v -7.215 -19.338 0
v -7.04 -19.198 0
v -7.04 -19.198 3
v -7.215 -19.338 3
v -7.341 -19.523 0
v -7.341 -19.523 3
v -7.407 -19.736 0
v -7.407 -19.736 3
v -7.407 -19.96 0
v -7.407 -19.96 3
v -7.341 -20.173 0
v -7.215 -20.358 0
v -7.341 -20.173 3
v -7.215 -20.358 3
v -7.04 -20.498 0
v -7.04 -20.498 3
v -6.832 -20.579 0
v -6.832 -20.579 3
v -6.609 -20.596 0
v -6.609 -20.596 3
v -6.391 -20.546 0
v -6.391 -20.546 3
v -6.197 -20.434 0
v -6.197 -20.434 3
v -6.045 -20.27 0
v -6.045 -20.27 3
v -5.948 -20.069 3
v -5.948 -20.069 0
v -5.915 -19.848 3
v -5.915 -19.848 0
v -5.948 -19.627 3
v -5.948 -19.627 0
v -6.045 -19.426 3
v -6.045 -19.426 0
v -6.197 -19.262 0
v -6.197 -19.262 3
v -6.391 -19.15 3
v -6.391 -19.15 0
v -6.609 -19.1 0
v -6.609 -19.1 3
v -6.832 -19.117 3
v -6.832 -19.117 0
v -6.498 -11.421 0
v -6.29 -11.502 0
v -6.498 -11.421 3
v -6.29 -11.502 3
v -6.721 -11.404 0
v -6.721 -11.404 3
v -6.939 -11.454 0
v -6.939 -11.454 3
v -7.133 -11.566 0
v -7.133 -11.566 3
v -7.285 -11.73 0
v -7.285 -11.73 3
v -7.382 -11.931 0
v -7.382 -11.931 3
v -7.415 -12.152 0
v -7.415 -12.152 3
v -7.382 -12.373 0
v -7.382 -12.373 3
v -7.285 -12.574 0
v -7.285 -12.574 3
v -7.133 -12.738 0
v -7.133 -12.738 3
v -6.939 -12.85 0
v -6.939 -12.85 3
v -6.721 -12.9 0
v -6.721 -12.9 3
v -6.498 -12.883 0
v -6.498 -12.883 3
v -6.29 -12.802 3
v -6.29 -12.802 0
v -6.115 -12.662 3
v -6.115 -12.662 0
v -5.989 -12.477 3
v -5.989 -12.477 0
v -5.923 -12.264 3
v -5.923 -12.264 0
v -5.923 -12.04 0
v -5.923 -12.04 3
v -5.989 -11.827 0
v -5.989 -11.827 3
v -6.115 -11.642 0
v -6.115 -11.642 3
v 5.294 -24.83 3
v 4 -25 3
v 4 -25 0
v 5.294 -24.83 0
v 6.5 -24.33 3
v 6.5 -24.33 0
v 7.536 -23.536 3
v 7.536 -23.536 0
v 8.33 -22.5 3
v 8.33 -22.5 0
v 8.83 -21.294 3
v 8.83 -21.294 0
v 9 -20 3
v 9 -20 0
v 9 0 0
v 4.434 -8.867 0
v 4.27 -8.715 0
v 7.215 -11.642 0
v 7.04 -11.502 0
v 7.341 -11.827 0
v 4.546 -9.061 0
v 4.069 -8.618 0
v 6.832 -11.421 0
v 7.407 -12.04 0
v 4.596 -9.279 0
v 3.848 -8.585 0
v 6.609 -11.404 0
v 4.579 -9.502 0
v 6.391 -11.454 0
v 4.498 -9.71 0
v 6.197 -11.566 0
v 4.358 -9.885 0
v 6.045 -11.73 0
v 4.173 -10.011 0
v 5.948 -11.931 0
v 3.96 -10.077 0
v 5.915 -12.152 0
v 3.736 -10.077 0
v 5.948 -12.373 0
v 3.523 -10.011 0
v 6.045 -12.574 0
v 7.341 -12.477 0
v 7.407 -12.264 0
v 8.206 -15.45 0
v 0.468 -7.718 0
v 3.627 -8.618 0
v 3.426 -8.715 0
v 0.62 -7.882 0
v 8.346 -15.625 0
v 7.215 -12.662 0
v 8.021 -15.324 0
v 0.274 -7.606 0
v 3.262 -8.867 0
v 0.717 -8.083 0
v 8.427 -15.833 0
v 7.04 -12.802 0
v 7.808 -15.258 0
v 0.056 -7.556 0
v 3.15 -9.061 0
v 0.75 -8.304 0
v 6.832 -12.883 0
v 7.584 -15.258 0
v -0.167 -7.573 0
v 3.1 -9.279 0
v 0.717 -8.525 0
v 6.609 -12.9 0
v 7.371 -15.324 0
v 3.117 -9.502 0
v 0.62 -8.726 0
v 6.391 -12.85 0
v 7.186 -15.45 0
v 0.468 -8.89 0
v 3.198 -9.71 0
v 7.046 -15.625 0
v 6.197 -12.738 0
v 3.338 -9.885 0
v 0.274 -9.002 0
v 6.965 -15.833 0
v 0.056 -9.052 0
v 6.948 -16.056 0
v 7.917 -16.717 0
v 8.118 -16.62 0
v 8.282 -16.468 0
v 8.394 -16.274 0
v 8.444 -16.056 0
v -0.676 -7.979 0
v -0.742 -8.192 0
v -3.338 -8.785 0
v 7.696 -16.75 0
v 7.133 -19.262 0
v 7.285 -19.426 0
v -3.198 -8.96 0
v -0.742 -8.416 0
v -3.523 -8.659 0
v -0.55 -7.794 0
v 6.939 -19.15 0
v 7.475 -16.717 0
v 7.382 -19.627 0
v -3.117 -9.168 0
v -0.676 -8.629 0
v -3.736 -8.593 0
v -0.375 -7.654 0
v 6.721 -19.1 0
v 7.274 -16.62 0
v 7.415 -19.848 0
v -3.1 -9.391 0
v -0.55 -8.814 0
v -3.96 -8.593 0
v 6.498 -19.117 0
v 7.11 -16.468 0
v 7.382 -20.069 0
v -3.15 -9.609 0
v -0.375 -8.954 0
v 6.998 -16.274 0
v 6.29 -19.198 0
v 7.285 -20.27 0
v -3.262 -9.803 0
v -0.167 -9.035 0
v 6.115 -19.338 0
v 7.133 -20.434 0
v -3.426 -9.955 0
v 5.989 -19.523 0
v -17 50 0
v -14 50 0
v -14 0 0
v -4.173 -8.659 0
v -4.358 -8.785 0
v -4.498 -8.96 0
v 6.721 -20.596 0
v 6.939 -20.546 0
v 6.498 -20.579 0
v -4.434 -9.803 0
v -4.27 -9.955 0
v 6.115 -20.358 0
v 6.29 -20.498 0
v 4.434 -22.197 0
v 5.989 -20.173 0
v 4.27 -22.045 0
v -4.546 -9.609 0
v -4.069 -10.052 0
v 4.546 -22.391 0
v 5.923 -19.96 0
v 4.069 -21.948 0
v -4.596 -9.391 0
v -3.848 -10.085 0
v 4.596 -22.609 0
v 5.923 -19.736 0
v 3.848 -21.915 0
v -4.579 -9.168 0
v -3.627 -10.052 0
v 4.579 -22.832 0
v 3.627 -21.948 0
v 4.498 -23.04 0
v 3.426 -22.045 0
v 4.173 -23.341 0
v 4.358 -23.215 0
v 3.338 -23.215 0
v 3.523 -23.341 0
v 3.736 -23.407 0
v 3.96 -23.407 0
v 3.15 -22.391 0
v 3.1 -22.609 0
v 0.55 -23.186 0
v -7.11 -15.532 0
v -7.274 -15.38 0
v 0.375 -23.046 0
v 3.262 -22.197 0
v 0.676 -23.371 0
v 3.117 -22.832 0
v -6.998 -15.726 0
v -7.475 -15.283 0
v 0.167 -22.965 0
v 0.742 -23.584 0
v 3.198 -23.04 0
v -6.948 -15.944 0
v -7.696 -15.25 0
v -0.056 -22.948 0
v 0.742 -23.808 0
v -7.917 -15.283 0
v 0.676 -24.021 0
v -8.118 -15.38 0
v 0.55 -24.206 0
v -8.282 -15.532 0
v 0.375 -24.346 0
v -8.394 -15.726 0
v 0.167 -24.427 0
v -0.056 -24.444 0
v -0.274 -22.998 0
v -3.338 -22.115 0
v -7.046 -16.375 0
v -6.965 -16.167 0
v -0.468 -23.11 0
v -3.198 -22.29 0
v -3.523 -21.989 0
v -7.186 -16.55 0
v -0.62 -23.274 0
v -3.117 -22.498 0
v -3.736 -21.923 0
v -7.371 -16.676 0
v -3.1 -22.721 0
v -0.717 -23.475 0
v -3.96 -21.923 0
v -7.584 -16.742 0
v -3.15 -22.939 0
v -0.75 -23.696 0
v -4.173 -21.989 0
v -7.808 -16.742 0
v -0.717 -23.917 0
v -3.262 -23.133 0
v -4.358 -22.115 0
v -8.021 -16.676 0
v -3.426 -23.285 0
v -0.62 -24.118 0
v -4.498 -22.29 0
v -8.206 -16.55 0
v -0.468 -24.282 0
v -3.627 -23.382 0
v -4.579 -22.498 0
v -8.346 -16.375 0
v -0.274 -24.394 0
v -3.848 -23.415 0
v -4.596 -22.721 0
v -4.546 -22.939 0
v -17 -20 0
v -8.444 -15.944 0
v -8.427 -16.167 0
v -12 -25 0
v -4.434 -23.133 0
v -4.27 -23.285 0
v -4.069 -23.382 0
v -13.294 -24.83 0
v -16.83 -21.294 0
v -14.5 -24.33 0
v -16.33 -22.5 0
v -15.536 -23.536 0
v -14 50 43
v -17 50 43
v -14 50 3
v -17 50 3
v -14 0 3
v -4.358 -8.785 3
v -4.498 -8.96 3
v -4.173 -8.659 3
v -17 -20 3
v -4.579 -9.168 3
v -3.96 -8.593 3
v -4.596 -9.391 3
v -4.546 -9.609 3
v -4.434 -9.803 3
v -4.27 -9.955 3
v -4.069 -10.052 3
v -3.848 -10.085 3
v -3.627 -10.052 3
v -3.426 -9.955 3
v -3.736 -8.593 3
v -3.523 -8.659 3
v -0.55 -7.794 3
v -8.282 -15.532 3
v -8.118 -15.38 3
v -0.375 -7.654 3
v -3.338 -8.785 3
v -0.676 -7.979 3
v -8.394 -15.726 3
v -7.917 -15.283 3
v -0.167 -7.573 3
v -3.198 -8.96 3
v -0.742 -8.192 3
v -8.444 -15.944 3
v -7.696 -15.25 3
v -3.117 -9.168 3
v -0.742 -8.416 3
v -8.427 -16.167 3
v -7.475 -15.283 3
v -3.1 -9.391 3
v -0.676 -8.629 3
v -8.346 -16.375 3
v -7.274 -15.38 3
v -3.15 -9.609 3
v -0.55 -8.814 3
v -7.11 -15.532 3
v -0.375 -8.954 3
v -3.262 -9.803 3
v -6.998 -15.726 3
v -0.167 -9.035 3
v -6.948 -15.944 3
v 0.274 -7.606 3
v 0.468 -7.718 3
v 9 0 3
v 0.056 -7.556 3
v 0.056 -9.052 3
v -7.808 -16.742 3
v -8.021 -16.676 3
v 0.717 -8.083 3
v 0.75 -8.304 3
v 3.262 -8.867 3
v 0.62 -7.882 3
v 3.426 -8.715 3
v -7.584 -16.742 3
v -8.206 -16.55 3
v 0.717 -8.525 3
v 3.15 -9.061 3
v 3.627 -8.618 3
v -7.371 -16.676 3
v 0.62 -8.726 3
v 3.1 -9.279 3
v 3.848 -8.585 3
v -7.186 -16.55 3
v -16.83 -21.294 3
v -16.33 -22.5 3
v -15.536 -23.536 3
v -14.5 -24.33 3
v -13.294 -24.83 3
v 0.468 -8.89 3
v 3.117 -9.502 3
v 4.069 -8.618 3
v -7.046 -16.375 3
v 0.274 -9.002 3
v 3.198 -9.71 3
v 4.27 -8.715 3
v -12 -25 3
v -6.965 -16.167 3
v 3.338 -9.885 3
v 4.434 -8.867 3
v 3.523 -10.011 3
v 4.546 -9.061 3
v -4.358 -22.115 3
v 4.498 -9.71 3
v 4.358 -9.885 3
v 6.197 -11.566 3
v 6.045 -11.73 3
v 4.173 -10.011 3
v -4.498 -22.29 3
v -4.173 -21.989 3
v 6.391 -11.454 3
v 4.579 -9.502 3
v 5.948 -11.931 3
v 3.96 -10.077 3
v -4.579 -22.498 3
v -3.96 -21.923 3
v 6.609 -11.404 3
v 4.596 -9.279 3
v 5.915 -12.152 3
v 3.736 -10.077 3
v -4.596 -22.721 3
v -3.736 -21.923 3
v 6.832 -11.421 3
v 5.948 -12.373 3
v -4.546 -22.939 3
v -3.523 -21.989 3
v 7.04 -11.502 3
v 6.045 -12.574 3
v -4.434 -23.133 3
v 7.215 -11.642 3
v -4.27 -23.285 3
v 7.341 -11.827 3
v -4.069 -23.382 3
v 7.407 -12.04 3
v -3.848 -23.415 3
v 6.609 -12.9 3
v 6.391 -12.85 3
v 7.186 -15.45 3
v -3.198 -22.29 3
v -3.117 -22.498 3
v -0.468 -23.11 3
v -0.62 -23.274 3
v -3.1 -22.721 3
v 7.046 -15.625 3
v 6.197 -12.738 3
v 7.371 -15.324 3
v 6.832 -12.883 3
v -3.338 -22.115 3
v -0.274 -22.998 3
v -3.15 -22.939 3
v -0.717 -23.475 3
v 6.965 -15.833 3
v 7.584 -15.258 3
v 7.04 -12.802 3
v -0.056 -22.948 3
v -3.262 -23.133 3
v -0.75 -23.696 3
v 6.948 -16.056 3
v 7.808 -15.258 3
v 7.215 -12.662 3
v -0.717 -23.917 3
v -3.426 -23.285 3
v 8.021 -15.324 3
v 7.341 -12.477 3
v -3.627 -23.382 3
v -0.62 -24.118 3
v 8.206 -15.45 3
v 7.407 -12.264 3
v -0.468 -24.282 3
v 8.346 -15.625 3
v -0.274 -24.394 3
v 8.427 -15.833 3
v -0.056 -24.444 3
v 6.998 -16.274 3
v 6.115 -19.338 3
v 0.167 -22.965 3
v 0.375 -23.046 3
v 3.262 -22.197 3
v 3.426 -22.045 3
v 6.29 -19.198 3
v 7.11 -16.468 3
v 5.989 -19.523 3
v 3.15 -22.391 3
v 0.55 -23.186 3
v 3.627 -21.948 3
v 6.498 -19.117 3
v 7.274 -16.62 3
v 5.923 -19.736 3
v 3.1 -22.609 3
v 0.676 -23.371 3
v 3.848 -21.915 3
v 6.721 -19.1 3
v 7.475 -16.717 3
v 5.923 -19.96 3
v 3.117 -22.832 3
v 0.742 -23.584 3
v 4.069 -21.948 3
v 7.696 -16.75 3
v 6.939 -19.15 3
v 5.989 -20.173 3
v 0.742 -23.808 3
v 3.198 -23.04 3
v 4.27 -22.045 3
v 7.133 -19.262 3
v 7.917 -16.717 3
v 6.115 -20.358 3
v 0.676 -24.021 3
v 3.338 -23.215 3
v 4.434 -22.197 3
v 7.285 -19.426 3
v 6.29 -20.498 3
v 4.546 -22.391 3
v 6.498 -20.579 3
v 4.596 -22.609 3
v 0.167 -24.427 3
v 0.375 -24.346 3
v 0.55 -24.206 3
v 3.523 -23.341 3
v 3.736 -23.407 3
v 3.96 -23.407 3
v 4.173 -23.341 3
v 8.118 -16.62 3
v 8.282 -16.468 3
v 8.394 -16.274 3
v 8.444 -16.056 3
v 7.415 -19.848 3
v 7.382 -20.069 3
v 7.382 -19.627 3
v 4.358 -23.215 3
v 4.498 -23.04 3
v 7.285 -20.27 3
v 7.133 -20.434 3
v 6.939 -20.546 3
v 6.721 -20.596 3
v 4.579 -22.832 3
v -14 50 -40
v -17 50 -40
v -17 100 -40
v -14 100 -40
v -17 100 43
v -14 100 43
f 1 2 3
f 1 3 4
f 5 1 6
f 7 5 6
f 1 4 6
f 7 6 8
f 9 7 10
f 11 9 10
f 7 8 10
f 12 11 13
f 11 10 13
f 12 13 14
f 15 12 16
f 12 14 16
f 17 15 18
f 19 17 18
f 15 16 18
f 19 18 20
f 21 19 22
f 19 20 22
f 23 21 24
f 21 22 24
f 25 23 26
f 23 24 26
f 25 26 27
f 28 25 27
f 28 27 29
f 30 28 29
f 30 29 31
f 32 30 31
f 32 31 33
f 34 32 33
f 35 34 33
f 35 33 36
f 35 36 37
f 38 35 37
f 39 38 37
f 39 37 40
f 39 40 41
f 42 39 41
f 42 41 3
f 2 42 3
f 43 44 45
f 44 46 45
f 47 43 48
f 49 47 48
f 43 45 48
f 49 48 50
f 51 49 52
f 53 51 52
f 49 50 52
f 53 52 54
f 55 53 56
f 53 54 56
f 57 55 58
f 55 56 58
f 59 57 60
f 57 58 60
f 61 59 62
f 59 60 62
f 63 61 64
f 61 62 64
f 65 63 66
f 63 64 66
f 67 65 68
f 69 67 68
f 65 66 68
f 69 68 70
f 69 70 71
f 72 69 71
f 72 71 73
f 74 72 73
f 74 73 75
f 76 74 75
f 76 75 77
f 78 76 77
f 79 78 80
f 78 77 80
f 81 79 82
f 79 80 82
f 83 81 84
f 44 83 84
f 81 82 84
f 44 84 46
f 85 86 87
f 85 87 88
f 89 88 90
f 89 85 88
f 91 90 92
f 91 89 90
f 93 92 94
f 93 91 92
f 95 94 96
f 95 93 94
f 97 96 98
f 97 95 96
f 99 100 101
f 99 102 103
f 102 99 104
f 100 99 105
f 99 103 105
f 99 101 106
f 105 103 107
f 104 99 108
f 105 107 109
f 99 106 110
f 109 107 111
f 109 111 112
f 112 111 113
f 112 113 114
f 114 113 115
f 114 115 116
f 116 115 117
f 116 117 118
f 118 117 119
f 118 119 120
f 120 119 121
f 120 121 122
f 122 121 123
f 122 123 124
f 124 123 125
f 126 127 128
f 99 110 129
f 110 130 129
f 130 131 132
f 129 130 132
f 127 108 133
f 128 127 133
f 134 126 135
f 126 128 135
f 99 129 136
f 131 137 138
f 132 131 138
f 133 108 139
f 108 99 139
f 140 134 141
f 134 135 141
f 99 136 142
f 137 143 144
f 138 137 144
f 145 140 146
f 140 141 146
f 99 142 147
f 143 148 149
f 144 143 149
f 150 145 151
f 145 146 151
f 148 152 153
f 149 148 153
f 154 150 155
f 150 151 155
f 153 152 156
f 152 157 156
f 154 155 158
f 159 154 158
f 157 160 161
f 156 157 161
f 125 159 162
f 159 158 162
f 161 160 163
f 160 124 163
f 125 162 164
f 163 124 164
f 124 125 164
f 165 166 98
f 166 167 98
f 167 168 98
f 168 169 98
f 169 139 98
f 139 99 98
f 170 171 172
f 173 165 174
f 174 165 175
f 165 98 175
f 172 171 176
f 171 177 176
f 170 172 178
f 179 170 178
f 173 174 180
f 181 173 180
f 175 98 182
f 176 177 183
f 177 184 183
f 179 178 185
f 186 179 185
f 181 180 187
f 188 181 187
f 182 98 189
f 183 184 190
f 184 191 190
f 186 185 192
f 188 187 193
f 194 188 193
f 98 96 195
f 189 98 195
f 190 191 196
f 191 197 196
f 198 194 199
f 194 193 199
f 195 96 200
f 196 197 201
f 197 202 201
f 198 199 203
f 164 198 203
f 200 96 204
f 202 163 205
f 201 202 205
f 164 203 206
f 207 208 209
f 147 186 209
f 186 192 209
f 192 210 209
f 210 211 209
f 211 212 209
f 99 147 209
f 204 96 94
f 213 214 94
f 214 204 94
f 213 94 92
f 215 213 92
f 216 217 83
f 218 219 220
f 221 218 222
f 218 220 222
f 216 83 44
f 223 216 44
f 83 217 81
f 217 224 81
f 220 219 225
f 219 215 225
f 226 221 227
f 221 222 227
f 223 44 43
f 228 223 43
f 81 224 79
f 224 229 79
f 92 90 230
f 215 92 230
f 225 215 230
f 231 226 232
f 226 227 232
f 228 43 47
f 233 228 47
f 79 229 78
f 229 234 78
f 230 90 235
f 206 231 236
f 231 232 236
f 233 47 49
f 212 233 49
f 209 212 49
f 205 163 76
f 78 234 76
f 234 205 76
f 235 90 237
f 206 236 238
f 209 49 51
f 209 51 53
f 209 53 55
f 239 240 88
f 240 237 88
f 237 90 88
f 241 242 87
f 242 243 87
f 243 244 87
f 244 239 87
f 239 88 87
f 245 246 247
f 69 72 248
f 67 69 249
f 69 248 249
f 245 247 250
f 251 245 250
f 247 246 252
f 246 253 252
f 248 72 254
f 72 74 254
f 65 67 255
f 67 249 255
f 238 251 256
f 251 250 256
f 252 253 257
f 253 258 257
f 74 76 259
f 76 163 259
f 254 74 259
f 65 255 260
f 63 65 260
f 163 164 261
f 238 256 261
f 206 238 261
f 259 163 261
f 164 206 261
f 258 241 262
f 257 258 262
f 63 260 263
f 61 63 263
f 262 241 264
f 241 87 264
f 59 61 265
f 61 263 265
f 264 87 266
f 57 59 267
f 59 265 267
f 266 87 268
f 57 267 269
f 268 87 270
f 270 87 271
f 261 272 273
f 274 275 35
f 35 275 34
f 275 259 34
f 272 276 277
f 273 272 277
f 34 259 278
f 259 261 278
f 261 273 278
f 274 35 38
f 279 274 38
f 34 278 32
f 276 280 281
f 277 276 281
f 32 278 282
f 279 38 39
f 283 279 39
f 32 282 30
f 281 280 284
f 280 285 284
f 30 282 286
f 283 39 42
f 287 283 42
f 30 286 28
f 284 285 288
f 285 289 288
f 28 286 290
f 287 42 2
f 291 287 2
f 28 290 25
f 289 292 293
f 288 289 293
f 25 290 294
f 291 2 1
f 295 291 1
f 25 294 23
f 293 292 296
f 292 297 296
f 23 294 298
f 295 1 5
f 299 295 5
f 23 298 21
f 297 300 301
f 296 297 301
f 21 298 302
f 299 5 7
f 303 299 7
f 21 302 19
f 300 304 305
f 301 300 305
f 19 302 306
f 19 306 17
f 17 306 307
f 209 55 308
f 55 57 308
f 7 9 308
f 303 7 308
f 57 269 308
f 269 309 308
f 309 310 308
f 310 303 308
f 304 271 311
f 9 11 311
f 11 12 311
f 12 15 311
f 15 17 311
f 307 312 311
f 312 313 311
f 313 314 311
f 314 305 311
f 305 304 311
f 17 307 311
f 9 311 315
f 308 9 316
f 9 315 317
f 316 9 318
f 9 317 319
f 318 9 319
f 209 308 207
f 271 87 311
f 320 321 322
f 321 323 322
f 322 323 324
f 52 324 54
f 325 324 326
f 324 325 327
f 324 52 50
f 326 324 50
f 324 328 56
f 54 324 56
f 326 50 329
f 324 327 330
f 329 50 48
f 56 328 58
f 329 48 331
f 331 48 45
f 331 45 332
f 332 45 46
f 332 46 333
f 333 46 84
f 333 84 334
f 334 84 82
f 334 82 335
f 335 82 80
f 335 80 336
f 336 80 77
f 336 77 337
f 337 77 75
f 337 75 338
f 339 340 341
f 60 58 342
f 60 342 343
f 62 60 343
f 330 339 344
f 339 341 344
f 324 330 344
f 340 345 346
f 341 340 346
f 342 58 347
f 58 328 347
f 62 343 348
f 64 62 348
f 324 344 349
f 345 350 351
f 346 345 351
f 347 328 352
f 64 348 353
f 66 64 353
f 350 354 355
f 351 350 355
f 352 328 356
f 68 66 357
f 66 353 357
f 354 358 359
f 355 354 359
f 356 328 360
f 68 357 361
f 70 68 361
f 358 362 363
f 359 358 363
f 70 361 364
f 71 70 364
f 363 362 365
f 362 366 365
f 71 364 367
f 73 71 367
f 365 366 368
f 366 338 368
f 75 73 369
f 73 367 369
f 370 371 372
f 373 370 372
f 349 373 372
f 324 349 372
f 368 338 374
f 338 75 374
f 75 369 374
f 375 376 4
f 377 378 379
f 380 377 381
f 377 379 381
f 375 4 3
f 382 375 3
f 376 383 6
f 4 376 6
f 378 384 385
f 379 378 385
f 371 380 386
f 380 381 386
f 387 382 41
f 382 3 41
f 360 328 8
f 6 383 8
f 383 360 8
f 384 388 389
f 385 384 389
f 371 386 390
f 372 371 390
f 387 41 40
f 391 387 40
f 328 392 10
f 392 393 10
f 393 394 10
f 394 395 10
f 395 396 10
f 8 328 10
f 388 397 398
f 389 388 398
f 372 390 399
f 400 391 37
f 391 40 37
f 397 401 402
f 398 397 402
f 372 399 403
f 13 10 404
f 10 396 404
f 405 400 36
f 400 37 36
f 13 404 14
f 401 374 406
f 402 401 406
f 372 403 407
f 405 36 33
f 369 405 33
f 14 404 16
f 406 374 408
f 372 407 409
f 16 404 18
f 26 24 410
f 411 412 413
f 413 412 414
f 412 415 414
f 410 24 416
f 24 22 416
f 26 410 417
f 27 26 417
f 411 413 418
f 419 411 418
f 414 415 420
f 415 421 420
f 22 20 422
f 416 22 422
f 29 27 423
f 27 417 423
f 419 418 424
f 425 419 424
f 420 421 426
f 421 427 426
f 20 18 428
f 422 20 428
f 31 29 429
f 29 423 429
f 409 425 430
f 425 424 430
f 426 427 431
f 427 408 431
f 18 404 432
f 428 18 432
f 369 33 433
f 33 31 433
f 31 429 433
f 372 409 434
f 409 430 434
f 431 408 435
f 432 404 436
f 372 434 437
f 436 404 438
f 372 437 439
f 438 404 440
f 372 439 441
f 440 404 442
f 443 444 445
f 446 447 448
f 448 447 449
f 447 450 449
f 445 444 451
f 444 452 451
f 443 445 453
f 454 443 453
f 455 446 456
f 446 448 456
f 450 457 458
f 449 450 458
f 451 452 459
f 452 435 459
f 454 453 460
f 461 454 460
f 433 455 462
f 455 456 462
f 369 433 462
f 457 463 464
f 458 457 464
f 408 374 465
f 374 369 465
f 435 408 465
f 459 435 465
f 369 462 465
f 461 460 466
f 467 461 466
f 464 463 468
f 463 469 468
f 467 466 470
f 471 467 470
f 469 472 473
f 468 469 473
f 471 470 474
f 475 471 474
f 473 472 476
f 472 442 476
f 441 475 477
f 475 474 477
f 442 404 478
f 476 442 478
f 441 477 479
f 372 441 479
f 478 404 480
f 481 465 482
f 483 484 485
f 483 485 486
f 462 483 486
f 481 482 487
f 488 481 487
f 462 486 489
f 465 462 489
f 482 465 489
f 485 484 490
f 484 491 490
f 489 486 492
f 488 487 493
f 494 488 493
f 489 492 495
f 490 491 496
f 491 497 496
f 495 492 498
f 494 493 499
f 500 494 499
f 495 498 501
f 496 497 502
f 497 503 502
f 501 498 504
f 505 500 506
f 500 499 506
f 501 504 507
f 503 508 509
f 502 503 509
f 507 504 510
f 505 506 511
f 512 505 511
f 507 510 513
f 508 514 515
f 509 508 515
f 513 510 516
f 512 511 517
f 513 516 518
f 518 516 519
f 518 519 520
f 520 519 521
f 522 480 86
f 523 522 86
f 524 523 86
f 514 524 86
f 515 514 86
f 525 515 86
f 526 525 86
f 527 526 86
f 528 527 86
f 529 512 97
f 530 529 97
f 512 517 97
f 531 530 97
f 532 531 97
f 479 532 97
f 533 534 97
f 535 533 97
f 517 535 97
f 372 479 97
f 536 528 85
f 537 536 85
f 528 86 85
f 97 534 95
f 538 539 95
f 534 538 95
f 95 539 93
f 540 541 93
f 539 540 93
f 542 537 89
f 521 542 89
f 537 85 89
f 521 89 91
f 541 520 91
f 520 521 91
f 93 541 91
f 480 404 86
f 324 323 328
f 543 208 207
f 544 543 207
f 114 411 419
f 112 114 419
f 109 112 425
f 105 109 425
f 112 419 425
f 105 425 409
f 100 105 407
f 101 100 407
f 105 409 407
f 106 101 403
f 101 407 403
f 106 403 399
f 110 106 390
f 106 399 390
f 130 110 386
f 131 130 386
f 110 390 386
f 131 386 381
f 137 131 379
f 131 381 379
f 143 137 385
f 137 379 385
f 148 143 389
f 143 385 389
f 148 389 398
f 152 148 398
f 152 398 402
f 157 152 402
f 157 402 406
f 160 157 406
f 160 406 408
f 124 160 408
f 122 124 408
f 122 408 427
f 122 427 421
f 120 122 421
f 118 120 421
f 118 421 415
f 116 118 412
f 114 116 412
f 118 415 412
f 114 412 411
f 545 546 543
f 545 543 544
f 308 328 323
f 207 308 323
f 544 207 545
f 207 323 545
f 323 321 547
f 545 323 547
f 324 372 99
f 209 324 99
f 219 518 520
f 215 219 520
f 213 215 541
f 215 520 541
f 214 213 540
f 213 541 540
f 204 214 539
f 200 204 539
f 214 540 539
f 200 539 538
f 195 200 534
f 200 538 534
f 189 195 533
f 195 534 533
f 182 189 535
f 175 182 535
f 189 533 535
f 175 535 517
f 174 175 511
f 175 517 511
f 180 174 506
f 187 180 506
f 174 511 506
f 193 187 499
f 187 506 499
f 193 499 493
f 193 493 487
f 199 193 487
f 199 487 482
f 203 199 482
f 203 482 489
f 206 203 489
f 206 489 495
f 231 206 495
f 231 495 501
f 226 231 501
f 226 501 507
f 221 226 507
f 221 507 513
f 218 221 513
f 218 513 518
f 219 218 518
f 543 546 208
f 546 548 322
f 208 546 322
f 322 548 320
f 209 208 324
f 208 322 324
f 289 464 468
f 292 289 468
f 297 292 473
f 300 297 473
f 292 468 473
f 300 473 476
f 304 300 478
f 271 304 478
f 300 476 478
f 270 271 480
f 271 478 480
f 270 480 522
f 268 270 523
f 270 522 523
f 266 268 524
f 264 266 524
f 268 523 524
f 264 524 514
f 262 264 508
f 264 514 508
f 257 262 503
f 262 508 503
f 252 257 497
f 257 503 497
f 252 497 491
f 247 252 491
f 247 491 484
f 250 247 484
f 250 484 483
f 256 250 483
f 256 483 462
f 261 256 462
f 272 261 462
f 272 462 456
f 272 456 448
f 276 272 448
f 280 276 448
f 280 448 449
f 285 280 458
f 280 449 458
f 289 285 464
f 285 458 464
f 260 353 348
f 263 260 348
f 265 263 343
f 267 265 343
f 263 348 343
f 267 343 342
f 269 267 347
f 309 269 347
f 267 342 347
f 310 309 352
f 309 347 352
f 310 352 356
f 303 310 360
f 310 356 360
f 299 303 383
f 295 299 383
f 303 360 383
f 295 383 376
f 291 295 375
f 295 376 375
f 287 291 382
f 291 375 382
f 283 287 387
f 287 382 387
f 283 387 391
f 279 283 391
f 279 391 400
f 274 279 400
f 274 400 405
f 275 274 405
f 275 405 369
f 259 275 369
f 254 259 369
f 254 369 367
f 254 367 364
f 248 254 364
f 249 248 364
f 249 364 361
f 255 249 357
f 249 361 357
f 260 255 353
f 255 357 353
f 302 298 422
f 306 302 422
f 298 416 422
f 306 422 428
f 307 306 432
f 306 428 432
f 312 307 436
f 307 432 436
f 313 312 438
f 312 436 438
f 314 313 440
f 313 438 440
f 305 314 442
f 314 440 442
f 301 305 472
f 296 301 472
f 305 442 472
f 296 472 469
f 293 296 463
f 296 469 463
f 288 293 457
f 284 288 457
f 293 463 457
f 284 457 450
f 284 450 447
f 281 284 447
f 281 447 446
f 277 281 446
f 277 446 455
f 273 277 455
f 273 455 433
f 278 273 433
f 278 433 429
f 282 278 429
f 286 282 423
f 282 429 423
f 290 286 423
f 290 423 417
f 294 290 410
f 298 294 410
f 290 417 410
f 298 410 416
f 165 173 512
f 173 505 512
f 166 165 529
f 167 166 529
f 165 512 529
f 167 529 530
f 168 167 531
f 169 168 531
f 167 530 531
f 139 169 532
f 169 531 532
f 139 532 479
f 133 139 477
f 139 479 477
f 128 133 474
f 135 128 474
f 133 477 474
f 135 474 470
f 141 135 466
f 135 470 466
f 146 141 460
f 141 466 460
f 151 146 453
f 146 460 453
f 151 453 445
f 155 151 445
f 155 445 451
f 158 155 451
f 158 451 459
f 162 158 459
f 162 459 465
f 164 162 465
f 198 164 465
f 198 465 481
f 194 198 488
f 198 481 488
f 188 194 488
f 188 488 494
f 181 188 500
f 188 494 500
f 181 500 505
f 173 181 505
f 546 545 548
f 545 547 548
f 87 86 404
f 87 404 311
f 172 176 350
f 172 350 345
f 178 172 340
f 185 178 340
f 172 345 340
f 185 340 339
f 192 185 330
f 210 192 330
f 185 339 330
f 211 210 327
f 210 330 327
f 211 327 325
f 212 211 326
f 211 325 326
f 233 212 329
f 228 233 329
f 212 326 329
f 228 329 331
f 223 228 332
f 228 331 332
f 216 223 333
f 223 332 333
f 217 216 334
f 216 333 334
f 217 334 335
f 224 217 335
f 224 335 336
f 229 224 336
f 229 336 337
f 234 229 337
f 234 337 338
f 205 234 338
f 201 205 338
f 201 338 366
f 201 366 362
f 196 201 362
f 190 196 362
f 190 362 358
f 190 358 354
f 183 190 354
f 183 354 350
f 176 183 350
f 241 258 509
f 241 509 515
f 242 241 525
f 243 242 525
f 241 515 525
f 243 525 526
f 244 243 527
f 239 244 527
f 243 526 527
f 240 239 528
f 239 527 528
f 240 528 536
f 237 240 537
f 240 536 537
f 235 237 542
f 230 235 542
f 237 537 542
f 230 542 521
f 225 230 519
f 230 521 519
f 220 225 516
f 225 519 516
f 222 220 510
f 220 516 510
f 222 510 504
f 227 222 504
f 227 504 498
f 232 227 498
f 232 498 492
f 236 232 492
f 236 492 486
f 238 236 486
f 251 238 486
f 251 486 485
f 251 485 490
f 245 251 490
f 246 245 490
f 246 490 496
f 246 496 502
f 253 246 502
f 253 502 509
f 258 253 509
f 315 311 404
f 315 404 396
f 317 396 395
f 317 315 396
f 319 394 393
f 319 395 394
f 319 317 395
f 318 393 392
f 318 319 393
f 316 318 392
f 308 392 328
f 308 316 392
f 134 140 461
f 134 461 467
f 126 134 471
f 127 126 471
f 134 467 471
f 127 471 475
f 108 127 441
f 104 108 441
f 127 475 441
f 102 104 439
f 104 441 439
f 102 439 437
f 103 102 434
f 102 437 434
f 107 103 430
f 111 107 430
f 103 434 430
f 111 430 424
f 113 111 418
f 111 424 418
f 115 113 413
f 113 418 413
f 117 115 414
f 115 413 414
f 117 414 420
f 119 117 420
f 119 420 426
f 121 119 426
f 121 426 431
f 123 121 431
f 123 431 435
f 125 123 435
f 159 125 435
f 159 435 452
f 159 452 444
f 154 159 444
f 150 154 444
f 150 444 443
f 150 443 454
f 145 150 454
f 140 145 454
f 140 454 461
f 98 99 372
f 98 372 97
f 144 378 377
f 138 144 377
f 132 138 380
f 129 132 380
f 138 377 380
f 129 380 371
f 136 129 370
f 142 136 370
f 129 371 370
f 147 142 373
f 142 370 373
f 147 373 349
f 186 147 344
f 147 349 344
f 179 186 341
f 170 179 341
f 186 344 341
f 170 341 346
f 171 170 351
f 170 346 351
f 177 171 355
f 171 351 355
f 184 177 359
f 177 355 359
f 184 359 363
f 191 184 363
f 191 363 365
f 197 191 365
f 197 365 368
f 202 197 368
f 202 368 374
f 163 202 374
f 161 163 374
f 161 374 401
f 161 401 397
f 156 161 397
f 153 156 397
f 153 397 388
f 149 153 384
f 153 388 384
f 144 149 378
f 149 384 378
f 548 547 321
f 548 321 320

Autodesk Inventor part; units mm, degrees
ref_plane "YZ Plane" through (0, 0, 0) normal (1, 0, 0) x (0, 1, 0)
ref_plane "XZ Plane" through (0, 0, 0) normal (0, 1, 0) x (-1, 0, 0)
ref_plane "XY Plane" through (0, 0, 0) normal (0, 0, 1) x (1, 0, 0)
sketch "Sketch1" plane through (0, 0, 0) normal (0, 0, 1) x (1, 0, 0)
  line L0 (-9, 25) -> (9, 25)
  line L1 (9, 25) -> (9, -25)
  line L2 (9, -25) -> (-9, -25)
  line L3 (-9, -25) -> (-9, 25)
  point P0 (0, 0)
  point P1 (0, 25)
  point P2 (-9, 0)
  dimension "d0" = 18
  dimension "d1" = 50
extrude "Extrusion1" add sketch "Sketch1" along normal blind 3
sketch "Sketch2" plane through (0, 0, 3) normal (0, 0, 1) x (1, 0, 0)
  circle A0 centre (0, -16) radius 9
  circle A1 centre (0, 16) radius 9
  line L0 (-9, -25) -> (9, -25) projected
  circle A2 centre (0, -8.304) radius 0.75
  line L1 (9, 25) -> (-9, 25) projected
  point P0 (0, 0)
  point P1 (-4, -25)
  point P2 (4, -25)
  point P3 (4, 25)
  point P4 (-4, 25)
  dimension "d6" = 18
  dimension "d8" = 1.5
  dimension "d10" = 18
extrude "Extrusion2" cut sketch "Sketch2" against normal up to surface (3 mm away) contours A2
pattern_circular "Circular Pattern1" count 12 over 360 about axis through (0, -16, 3) along (0, 0, 1) of "Extrusion2"
sketch "Sketch7" plane through (0, 0, 3) normal (0, 0, 1) x (1, 0, 0)
  line L0 (-19, 0) -> (11, 0)
  line L1 (11, 0) -> (11, 28.3489)
  line L2 (11, 28.3489) -> (-19, 28.3489)
  line L3 (-19, 28.3489) -> (-19, 0)
  line L4 (-9, -25) -> (9, -25) projected
  line L5 (-9, 25) -> (-9, -25) projected
  line L6 (9, -25) -> (9, 25) projected
  point P0 (0, 0)
  point P1 (-4, -25)
  point P2 (4, -25)
  point P3 (-9, 20)
  point P4 (-9, -20)
  point P5 (9, -20)
  dimension "d44" = 25
  dimension "d48" = 30
  dimension "d49" = 2
extrude "Extrusion8" cut sketch "Sketch7" against normal up to surface (3 mm away) contours L3 L2 L1 L0
ref_plane "Work Plane1" through (-9, -20, 0) normal (-1, 0, 0) x (0, 0, 1)
sketch "Sketch9" plane through (-9, -20, 0) normal (-1, 0, 0) x (0, 0, 1)
  line L0 (3, 0) -> (3, 20)
  line L1 (3, 20) -> (0, 20)
  line L2 (0, 20) -> (0, 0)
  line L3 (3, 0) -> (3, -5)
  line L4 (3, -5) -> (0, -5)
  line L5 (0, -5) -> (3, -5) projected
  line L6 (0, -5) -> (0, 0)
extrude "Extrusion9" add sketch "Sketch9" along normal blind 8
fillet "Fillet3" radius 5 1 edges at (9, -25, 1.5)
sketch "Sketch10" plane through (9, 0, 3) normal (0, 1, 0) x (1, 0, 0)
  line L0 (-5, 3) -> (-26, 3) projected
  line L1 (-26, 0) -> (-23, 0)
  line L2 (-23, 0) -> (-23, 3)
  line L3 (-23, 3) -> (-26, 3)
  line L4 (-26, 3) -> (-26, 0)
  point P0 (-9, 3)
  dimension "d53" = 3
extrude "Extrusion10" add sketch "Sketch10" along normal blind 70
fillet "Fillet4" radius 5 1 edges at (-17, -25, 1.5)
sketch "Sketch11" plane through (0, 0, 3) normal (0, 0, 1) x (1, 0, 0)
  line L0 (-14, 0) -> (-14, 70) projected
  line L1 (-17, 70) -> (-14, 70)
  line L2 (-14, 70) -> (-14, 50)
  line L3 (-14, 50) -> (-17, 50)
  line L4 (-17, 50) -> (-17, 70)
  point P0 (0, 0)
  dimension "d57" = 20
extrude "Extrusion11" add sketch "Sketch11" along normal blind 30
sketch "Sketch12" plane through (0, 0, 0) normal (0, 0, -1) x (-1, 0, 0)
  line L0 (14, 0) -> (14, 70) projected
  line L1 (17, 70) -> (14, 70)
  line L2 (14, 70) -> (14, 50)
  line L3 (14, 50) -> (17, 50)
  line L4 (17, 50) -> (17, 70)
  point P0 (0, 0)
  dimension "d60" = 20
extrude "Extrusion12" add sketch "Sketch12" along normal blind 30
sketch "Sketch13" plane through (9, 70, 3) normal (0, 1, 0) x (1, 0, 0)
  line L0 (-26, 33) -> (-23, 33)
  line L1 (-23, 33) -> (-23, -30)
  line L2 (-23, -30) -> (-26, -30)
  line L3 (-26, -30) -> (-26, 33)
  point P0 (-9, 3)
extrude "Extrusion13" add sketch "Sketch13" along normal blind 30
sketch "Sketch14" plane through (0, 0, 33) normal (0, 0, 1) x (1, 0, 0)
  line L0 (-17, 50) -> (-14, 50)
  line L1 (-14, 50) -> (-14, 100)
  line L2 (-14, 100) -> (-17, 100)
  line L3 (-17, 100) -> (-17, 50)
  point P0 (0, 0)
extrude "Extrusion14" add sketch "Sketch14" along normal blind 10
sketch "Sketch15" plane through (0, 0, -30) normal (0, 0, -1) x (-1, 0, 0)
  line L0 (17, 100) -> (14, 100)
  line L1 (14, 100) -> (14, 50)
  line L2 (14, 50) -> (17, 50)
  line L3 (17, 50) -> (17, 100)
  point P0 (0, 0)
extrude "Extrusion15" add sketch "Sketch15" along normal blind 10
properties part number "second_perc_link"
